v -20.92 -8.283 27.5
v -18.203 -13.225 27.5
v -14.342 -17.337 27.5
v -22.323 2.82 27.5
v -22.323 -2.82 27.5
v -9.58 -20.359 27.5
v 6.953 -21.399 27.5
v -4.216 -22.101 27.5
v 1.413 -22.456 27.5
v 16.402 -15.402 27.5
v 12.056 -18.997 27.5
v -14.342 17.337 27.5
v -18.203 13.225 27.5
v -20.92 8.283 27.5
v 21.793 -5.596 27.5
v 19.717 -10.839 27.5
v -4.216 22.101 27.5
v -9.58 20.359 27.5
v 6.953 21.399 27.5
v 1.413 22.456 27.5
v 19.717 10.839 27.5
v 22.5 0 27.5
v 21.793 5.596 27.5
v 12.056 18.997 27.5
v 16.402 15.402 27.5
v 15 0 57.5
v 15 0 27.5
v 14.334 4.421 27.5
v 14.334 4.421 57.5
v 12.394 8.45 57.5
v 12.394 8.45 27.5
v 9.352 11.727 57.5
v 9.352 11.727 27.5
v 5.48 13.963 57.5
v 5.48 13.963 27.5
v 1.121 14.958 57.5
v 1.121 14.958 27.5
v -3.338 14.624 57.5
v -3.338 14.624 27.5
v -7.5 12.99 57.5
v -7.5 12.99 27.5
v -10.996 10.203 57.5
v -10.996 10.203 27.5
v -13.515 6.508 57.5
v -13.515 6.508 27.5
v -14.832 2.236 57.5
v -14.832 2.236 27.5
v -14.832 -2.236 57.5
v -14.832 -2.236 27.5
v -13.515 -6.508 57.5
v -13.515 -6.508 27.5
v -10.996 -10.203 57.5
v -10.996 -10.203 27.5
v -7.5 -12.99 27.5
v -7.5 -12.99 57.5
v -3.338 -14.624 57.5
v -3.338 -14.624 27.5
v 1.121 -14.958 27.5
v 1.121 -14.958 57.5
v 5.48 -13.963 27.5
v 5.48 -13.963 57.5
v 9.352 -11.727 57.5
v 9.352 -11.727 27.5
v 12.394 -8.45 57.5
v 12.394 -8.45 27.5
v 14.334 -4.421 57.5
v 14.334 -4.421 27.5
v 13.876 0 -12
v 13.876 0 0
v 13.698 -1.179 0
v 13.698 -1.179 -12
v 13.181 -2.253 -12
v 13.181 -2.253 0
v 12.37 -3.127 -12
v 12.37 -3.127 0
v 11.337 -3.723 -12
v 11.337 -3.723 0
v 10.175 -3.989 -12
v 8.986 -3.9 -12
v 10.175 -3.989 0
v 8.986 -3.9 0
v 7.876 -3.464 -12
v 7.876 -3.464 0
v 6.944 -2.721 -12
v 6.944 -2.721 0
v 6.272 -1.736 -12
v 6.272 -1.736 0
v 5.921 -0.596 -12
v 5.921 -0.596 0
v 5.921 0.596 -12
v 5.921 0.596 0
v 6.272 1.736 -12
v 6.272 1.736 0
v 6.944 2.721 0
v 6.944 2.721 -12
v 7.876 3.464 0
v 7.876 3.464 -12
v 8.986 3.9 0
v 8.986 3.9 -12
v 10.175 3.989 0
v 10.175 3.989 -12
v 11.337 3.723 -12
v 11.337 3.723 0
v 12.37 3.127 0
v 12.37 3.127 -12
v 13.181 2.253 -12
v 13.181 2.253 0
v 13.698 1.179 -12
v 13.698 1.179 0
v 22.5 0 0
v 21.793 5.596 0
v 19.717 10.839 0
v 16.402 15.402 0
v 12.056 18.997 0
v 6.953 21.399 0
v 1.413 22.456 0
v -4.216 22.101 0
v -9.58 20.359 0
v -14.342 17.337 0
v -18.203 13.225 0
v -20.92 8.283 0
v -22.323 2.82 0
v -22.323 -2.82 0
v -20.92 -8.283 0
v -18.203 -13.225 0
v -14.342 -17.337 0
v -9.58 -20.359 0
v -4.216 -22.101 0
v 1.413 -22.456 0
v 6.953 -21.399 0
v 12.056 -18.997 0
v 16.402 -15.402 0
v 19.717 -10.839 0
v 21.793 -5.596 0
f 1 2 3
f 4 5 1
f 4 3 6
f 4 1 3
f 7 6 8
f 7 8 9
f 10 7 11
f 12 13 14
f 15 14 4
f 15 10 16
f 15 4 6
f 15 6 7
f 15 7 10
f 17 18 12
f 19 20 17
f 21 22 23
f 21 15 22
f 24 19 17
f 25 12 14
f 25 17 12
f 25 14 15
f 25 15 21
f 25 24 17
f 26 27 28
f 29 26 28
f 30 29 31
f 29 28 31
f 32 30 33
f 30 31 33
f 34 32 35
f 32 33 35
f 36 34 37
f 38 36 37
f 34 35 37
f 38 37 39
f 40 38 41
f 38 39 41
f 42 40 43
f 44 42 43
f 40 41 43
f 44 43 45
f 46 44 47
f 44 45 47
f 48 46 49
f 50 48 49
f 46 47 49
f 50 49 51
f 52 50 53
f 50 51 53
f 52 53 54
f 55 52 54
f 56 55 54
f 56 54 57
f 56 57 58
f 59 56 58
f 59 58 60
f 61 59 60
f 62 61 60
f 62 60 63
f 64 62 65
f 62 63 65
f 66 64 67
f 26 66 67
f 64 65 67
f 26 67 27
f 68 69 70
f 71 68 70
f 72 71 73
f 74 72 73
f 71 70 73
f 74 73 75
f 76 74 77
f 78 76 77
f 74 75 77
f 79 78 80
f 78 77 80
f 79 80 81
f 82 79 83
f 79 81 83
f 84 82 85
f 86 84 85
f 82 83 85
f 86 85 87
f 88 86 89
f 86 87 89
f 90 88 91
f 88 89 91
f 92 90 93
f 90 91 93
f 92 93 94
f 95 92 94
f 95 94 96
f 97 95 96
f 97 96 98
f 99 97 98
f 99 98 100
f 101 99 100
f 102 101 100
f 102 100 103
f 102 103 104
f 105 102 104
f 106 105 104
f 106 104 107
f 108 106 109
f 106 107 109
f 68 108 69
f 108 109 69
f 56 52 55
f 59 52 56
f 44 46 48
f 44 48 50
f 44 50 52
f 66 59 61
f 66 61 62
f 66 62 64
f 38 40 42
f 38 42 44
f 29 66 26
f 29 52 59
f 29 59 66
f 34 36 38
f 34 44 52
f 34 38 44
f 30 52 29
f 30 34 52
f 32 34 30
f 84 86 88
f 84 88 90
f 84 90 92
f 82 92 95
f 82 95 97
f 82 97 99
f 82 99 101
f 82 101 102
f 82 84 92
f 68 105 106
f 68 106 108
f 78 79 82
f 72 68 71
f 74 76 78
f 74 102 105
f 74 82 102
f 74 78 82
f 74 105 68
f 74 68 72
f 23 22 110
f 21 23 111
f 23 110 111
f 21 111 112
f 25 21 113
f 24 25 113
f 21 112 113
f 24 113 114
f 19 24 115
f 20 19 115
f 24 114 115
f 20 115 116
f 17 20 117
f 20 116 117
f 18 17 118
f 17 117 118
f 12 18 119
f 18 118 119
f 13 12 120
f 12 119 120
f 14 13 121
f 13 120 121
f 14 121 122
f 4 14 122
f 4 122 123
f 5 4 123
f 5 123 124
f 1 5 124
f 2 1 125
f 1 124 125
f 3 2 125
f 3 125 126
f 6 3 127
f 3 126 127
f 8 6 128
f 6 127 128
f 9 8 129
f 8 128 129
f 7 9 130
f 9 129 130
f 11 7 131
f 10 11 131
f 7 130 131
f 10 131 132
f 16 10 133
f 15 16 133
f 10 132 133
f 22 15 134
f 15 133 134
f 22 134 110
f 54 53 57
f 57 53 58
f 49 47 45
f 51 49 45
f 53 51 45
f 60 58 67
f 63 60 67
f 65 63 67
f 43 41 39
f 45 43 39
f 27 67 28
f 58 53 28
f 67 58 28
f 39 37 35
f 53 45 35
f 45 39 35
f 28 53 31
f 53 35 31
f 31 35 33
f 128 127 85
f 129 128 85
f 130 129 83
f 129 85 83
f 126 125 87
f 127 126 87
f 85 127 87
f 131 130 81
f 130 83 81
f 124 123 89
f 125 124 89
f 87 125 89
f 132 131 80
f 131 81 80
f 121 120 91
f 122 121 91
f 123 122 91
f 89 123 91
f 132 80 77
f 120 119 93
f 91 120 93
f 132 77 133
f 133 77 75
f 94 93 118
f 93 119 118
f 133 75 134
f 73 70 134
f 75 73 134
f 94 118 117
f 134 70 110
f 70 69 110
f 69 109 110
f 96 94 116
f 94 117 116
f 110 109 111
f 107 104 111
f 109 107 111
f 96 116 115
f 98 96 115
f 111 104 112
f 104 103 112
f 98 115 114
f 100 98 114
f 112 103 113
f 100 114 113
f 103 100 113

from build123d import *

# Parameters (mm, degrees)
SKETCH1_R           = 22.5
BOSS_EXTRUDE1_DEPTH = 27.5
SKETCH2_R           = 15
BOSS_EXTRUDE2_DEPTH = 30
SKETCH3_R           = 4
BOSS_EXTRUDE3_DEPTH = 12


with BuildPart() as part:
    # Sketch1 → Boss-Extrude1 (new body)
    with BuildSketch(Plane.XY):
        Circle(SKETCH1_R)
    extrude(amount=BOSS_EXTRUDE1_DEPTH)

    # Sketch3 → Boss-Extrude3 (add)
    with BuildSketch(Plane(origin=(0, 0, 0), x_dir=(-1, 0, 0), z_dir=(0, 0, -1))):
        with Locations(Location((-9.875839743, 0, 0), (0, 0, 180))):
            Circle(SKETCH3_R)
    extrude(amount=BOSS_EXTRUDE3_DEPTH)


with BuildPart() as body_2:
    # Sketch2 → Boss-Extrude2 (new body)
    with BuildSketch(Plane.XY.offset(27.5)):
        Circle(SKETCH2_R)
    extrude(amount=BOSS_EXTRUDE2_DEPTH)


solid = Compound([part.part, body_2.part])
